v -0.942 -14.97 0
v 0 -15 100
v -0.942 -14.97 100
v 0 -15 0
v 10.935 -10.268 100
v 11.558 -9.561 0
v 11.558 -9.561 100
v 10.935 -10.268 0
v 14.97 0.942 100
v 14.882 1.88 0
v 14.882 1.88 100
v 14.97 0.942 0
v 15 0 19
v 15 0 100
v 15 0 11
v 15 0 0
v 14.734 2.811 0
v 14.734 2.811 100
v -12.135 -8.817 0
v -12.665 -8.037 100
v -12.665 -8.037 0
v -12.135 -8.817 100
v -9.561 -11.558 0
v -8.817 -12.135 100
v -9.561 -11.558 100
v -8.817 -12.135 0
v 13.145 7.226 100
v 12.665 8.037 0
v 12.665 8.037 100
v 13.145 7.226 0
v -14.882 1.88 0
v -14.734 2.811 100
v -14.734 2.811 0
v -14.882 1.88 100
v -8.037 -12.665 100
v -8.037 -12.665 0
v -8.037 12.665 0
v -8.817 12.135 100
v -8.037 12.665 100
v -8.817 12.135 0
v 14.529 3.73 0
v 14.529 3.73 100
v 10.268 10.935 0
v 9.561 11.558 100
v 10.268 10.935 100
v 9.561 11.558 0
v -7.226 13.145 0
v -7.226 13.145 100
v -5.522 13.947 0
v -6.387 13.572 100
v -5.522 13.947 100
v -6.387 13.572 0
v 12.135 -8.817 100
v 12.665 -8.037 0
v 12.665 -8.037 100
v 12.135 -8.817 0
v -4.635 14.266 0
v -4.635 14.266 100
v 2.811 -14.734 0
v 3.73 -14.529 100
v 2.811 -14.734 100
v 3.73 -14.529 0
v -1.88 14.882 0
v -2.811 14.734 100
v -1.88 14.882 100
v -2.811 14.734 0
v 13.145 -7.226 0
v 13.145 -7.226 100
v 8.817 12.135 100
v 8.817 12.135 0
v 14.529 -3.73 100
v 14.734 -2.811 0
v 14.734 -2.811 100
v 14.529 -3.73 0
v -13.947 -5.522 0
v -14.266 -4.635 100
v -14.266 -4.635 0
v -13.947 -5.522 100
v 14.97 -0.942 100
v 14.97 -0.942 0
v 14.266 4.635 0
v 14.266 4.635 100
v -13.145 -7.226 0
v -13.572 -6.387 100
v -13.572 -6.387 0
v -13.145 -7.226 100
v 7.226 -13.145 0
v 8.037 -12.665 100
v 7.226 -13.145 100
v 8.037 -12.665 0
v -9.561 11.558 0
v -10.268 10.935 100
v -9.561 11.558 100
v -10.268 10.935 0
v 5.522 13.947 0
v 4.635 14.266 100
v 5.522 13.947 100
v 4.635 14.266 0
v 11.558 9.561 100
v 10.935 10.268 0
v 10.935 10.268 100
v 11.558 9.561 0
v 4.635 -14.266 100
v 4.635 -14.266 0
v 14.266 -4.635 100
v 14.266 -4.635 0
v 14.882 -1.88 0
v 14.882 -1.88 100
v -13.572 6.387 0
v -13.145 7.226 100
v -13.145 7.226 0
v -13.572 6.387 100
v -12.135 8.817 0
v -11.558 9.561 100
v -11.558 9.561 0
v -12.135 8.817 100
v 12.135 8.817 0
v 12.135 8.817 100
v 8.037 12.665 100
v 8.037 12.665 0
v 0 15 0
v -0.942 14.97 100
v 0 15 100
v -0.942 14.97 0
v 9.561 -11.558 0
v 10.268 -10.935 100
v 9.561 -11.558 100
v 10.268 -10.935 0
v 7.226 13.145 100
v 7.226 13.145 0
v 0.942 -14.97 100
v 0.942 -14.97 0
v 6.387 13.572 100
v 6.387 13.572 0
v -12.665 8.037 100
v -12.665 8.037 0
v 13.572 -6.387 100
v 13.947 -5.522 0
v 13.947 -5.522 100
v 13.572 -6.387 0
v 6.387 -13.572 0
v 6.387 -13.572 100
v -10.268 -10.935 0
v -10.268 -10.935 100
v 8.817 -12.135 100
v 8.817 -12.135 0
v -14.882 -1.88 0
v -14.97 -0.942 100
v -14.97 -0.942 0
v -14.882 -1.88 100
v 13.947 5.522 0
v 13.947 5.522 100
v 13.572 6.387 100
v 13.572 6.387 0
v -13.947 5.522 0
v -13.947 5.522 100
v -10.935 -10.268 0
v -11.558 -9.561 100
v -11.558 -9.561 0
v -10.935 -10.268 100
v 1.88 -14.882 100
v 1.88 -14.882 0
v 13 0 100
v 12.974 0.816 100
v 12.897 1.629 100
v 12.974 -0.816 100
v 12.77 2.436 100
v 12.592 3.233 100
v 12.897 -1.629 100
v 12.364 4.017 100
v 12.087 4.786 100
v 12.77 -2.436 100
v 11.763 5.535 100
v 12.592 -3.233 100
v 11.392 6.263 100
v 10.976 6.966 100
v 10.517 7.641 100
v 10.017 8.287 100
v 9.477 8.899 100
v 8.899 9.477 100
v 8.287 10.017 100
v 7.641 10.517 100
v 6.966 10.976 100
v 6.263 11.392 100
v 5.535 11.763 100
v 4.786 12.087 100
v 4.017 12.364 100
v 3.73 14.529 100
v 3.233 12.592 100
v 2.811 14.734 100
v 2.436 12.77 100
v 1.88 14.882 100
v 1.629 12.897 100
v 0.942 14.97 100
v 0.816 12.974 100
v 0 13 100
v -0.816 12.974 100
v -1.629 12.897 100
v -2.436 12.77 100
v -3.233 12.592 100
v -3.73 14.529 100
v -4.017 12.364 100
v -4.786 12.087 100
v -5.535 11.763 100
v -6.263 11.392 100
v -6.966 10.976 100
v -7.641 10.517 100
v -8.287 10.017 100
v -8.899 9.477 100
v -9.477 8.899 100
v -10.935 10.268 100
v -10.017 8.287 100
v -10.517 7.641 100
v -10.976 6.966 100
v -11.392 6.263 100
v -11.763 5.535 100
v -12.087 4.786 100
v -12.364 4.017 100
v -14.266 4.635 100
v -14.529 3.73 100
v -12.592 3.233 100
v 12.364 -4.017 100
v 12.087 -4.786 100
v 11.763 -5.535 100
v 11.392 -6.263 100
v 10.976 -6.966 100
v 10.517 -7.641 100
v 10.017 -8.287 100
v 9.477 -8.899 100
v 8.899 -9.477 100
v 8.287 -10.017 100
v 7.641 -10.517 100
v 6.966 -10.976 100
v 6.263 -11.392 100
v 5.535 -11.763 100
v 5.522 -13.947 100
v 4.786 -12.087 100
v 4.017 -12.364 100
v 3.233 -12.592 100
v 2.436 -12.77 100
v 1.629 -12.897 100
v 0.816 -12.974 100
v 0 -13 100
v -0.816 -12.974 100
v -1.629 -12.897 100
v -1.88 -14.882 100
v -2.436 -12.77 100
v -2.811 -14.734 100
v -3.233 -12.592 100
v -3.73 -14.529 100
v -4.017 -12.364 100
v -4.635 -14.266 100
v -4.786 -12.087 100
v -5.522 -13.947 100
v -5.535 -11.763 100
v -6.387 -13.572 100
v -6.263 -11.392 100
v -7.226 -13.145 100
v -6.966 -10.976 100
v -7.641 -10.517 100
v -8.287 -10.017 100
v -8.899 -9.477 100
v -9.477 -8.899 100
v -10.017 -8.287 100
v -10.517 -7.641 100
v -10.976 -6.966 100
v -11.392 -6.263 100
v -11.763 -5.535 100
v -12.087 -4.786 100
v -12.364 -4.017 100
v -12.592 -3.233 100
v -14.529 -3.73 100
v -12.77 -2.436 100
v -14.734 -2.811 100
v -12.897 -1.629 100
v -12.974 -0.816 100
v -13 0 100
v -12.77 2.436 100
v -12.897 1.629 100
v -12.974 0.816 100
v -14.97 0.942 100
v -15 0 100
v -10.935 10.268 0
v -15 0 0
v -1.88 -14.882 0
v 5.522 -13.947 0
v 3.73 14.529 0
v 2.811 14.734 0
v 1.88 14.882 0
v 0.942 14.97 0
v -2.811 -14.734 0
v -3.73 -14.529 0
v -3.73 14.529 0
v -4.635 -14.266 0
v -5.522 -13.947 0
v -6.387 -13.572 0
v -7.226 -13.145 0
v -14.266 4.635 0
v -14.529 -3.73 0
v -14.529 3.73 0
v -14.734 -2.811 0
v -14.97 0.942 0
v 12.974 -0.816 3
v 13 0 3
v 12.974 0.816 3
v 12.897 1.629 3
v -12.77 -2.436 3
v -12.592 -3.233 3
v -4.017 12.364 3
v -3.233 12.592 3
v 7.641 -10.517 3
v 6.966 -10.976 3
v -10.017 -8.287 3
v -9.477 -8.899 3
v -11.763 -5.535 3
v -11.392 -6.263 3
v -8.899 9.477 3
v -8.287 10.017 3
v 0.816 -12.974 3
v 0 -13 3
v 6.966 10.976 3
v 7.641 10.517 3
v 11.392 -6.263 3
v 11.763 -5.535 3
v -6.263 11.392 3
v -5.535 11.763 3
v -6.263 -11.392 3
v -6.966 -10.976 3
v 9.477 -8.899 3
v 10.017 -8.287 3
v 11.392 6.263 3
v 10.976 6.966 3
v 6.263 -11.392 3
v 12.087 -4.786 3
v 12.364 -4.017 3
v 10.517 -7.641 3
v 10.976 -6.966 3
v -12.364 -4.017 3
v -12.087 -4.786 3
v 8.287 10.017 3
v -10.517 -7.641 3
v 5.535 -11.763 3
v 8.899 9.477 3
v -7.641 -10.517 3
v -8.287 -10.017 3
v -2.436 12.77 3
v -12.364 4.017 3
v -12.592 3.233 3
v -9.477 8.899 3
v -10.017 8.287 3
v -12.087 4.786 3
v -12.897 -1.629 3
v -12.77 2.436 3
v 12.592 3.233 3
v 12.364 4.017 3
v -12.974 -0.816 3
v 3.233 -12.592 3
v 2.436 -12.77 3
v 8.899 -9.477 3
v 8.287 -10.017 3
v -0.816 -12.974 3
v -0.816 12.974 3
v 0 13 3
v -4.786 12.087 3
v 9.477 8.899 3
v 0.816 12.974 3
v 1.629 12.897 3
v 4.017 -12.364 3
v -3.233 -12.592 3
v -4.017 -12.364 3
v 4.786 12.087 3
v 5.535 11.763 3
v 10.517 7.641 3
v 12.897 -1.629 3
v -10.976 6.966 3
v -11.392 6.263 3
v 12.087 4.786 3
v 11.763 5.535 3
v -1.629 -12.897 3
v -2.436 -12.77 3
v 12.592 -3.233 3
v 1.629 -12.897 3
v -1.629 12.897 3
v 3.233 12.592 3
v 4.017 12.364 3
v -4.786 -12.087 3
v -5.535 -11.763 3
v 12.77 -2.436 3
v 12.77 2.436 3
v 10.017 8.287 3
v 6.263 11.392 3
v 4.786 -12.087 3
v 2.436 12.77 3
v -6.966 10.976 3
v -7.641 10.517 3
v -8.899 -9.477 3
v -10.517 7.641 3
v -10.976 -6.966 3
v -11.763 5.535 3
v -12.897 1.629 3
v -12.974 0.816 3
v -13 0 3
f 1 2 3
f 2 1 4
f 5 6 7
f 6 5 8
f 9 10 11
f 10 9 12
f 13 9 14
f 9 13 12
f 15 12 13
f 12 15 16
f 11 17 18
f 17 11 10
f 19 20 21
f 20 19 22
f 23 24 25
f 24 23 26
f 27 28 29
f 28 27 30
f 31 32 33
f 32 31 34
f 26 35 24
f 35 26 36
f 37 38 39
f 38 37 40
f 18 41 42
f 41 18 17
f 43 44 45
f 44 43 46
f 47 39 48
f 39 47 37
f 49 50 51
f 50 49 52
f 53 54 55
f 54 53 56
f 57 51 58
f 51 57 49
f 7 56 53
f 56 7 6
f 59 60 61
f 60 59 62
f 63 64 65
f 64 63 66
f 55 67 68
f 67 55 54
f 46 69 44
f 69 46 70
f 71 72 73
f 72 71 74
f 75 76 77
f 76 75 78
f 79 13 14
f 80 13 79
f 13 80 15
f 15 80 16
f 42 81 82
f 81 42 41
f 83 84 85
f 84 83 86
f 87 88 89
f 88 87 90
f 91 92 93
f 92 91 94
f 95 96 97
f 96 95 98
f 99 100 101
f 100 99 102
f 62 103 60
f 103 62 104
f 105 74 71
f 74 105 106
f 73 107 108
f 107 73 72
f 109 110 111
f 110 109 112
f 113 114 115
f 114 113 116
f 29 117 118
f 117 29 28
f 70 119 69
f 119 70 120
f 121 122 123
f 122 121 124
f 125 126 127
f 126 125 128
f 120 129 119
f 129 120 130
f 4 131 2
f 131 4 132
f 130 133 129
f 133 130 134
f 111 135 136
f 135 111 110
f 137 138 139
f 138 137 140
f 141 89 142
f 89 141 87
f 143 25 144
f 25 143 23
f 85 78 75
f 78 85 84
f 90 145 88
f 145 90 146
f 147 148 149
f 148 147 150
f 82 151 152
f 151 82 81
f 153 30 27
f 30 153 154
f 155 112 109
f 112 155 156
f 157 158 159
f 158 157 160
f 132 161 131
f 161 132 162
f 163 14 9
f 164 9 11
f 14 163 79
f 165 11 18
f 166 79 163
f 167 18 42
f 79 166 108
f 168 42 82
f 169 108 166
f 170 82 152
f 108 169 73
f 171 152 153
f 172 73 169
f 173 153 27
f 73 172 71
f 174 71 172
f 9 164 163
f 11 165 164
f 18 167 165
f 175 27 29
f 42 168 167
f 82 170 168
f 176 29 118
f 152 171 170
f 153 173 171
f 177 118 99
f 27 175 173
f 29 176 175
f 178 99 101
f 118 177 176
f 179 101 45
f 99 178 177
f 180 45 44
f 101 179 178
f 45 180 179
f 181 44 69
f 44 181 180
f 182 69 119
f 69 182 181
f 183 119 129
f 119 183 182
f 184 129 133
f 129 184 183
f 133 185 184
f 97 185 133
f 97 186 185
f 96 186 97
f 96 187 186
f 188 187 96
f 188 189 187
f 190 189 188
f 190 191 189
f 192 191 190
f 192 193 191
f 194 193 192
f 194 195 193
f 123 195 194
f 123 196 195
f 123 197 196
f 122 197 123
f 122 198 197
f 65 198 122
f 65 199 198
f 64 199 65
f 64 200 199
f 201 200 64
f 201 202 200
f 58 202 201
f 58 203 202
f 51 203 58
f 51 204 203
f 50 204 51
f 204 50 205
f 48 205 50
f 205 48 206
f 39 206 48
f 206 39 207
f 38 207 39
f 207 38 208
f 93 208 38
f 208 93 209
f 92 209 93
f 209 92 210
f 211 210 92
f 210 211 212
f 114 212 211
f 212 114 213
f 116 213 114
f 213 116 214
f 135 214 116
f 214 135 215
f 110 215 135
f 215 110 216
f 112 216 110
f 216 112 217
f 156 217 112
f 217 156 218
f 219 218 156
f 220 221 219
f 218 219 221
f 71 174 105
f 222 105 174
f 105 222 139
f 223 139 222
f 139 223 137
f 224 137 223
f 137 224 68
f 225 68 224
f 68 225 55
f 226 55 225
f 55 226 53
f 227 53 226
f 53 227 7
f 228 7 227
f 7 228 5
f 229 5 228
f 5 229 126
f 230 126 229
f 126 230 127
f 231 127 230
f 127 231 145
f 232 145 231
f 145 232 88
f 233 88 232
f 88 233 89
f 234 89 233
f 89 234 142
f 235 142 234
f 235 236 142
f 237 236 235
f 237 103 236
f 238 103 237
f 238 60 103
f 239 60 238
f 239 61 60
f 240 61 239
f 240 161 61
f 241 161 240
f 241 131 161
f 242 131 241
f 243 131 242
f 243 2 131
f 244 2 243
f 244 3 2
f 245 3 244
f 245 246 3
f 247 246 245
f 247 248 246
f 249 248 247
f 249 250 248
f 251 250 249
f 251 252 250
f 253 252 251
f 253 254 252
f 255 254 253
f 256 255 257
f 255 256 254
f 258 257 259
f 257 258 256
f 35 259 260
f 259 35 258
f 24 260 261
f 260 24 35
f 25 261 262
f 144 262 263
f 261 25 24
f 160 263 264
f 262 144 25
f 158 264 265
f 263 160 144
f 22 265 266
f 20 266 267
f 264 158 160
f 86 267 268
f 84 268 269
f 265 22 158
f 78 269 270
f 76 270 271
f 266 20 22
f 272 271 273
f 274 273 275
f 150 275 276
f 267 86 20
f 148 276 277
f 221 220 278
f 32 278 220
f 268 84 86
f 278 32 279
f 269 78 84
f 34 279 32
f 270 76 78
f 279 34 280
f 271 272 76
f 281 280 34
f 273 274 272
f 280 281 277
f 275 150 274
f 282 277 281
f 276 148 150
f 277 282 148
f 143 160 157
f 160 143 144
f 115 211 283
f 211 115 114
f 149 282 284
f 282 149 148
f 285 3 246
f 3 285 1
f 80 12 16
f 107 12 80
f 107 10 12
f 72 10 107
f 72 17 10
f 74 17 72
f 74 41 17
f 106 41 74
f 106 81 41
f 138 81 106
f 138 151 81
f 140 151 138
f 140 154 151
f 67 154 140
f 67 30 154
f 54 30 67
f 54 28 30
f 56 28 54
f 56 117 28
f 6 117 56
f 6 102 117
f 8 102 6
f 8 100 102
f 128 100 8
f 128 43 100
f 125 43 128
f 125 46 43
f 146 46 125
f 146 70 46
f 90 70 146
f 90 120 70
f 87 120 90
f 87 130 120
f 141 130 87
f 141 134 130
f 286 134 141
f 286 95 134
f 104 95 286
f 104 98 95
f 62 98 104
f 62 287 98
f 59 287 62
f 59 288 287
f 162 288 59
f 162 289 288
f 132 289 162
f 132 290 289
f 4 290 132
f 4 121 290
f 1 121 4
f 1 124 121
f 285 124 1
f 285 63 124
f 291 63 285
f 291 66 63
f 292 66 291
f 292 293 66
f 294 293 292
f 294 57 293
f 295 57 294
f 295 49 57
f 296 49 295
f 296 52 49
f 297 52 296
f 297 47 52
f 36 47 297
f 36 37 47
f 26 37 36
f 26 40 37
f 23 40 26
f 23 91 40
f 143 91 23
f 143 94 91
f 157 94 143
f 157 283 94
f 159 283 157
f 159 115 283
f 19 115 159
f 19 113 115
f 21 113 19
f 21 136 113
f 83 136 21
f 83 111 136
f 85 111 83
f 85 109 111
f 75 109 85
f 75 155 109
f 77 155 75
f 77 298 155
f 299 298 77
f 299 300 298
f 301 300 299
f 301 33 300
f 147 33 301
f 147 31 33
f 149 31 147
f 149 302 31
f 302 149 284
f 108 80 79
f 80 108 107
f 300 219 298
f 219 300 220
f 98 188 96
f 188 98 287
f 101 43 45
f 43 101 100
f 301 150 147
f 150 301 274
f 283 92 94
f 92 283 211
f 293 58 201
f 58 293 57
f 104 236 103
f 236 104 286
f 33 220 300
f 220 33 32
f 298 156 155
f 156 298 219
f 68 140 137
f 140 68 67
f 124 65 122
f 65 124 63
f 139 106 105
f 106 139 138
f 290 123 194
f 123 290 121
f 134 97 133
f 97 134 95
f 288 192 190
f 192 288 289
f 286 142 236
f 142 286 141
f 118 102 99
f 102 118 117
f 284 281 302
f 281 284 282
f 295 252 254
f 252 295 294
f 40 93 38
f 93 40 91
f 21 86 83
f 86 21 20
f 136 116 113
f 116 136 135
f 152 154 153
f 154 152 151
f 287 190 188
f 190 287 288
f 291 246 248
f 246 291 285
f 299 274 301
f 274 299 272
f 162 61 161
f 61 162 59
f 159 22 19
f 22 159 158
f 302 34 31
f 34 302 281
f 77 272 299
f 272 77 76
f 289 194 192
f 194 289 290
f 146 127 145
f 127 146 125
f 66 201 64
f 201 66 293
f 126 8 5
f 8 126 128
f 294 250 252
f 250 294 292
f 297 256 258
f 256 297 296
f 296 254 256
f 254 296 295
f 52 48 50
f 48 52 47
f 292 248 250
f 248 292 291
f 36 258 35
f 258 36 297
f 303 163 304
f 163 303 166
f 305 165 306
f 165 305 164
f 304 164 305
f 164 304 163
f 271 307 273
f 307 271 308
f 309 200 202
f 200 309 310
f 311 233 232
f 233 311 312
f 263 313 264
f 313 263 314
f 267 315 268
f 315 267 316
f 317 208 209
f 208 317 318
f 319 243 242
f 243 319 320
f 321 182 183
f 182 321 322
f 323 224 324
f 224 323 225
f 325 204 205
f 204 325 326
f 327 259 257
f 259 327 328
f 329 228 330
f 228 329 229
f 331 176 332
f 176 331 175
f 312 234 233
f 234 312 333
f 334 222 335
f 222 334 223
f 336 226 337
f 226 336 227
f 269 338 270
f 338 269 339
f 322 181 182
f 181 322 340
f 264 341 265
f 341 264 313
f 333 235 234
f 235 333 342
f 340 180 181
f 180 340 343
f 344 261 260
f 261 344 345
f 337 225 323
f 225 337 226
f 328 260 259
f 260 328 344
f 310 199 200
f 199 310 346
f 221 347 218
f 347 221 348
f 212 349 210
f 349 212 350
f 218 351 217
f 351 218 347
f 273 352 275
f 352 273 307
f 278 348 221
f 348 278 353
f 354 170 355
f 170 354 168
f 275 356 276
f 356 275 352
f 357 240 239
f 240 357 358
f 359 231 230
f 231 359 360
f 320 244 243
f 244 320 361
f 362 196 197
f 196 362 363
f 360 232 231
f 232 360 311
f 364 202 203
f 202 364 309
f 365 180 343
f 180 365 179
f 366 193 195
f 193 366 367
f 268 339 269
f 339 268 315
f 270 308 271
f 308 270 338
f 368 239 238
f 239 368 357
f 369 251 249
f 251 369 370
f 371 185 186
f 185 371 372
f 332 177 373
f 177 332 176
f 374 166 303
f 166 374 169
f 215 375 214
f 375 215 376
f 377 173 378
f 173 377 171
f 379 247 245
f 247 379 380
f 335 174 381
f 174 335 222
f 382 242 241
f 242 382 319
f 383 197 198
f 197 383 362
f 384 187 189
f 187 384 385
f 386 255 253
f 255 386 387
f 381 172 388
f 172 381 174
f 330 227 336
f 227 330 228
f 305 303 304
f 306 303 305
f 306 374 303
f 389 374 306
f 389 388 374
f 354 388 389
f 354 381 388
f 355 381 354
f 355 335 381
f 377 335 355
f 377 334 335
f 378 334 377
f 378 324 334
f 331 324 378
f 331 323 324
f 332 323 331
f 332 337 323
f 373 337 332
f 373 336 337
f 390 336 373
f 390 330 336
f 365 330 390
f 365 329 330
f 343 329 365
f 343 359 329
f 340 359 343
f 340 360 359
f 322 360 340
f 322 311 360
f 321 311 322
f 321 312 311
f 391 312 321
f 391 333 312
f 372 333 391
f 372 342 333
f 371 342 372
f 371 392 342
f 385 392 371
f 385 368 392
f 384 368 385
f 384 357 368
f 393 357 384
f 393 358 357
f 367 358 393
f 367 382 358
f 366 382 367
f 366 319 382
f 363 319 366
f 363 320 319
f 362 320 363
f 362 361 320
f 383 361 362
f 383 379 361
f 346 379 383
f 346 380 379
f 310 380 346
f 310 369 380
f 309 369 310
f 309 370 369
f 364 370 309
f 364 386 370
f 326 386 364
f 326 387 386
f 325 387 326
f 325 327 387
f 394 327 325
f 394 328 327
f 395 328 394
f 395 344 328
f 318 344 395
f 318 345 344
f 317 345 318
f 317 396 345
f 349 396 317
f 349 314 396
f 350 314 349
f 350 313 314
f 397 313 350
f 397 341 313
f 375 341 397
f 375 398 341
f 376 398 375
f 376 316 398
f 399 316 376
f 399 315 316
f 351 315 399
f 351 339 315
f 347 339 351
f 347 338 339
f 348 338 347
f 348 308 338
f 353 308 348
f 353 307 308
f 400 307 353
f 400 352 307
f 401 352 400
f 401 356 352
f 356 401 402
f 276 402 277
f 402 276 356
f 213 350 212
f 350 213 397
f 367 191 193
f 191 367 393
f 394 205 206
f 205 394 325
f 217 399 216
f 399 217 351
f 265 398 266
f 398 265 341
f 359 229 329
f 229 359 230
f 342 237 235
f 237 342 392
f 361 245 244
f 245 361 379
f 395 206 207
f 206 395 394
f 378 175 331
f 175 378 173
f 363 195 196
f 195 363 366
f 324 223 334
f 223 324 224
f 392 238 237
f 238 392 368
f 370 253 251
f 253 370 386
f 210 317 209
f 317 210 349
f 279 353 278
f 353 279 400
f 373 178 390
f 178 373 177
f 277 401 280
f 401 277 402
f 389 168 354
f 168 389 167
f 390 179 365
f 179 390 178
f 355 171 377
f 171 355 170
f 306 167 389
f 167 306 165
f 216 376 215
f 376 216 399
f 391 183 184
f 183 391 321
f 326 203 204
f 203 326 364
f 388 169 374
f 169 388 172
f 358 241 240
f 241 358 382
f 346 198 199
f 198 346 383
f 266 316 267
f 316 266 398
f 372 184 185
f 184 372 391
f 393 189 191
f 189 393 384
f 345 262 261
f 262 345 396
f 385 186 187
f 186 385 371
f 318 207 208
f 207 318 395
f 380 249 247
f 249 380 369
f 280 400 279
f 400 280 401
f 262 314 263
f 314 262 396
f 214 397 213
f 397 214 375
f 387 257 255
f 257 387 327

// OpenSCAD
/*
 * HIRT Probe Head (Nose Capsule)
 * 
 * 3D printable probe head for electronics pod
 * 
 * Specifications:
 * - Outer Diameter: 30mm
 * - Length: 100mm
 * - Wall Thickness: 2mm
 * - Material: PETG or ABS
 * 
 * Features:
 * - Threaded connection to rod (top)
 * - Removable cap (bottom)
 * - Cable gland mount (side)
 * - Internal space for electronics and coils
 */

// Parameters (customize as needed)
probe_head_od = 30;          // Outer diameter (mm)
probe_head_length = 100;    // Total length (mm)
wall_thickness = 2;          // Wall thickness (mm)
thread_od = 25;             // Thread outer diameter (matches rod)
thread_length = 20;          // Thread engagement length (mm)
thread_pitch = 2.5;          // Thread pitch (mm) - 4 TPI equivalent
cable_gland_dia = 8;         // Cable gland hole diameter (mm)
cable_gland_height = 15;     // Height of cable gland mount (mm)

// Calculated dimensions
probe_head_id = probe_head_od - 2 * wall_thickness;
cap_thickness = 3;           // Cap wall thickness (mm)
cap_thread_length = 10;      // Cap thread length (mm)

// Main body
module probe_head_body() {
    difference() {
        // Outer cylinder
        cylinder(h = probe_head_length, d = probe_head_od, $fn = 100);
        
        // Inner cavity
        translate([0, 0, cap_thickness])
            cylinder(h = probe_head_length - cap_thickness, d = probe_head_id, $fn = 100);
        
        // Cable gland hole
        translate([probe_head_od/2, 0, cable_gland_height])
            rotate([0, 90, 0])
                cylinder(h = wall_thickness + 1, d = cable_gland_dia, $fn = 50);
    }
}

// Threaded section (top, connects to rod)
module top_thread() {
    difference() {
        // Threaded cylinder
        cylinder(h = thread_length, d = thread_od + 0.5, $fn = 100);
        
        // Internal thread (simplified - use tap for actual threads)
        translate([0, 0, -0.5])
            cylinder(h = thread_length + 1, d = thread_od - 1, $fn = 100);
    }
}

// Cap (removable bottom)
module cap() {
    difference() {
        // Cap body
        cylinder(h = cap_thickness, d = probe_head_od, $fn = 100);
        
        // Internal thread for cap (simplified)
        translate([0, 0, -0.5])
            cylinder(h = cap_thickness + 1, d = probe_head_id - 0.5, $fn = 100);
    }
    
    // Cap thread section
    translate([0, 0, cap_thickness])
        difference() {
            cylinder(h = cap_thread_length, d = probe_head_id - 0.2, $fn = 100);
            translate([0, 0, -0.5])
                cylinder(h = cap_thread_length + 1, d = probe_head_id - 1, $fn = 100);
        }
}

// Assembly view (comment out for separate parts)
module assembly() {
    // Main body
    probe_head_body();
    
    // Top thread
    translate([0, 0, probe_head_length])
        top_thread();
    
    // Cap (shown separated)
    translate([0, 0, -cap_thickness - cap_thread_length - 5])
        cap();
}

// Export individual parts
// Uncomment the part you want to export:

// Main body only
probe_head_body();

// Top thread only (for separate printing if needed)
// translate([0, 0, probe_head_length]) top_thread();

// Cap only
// cap();

// Full assembly (for visualization)
// assembly();
